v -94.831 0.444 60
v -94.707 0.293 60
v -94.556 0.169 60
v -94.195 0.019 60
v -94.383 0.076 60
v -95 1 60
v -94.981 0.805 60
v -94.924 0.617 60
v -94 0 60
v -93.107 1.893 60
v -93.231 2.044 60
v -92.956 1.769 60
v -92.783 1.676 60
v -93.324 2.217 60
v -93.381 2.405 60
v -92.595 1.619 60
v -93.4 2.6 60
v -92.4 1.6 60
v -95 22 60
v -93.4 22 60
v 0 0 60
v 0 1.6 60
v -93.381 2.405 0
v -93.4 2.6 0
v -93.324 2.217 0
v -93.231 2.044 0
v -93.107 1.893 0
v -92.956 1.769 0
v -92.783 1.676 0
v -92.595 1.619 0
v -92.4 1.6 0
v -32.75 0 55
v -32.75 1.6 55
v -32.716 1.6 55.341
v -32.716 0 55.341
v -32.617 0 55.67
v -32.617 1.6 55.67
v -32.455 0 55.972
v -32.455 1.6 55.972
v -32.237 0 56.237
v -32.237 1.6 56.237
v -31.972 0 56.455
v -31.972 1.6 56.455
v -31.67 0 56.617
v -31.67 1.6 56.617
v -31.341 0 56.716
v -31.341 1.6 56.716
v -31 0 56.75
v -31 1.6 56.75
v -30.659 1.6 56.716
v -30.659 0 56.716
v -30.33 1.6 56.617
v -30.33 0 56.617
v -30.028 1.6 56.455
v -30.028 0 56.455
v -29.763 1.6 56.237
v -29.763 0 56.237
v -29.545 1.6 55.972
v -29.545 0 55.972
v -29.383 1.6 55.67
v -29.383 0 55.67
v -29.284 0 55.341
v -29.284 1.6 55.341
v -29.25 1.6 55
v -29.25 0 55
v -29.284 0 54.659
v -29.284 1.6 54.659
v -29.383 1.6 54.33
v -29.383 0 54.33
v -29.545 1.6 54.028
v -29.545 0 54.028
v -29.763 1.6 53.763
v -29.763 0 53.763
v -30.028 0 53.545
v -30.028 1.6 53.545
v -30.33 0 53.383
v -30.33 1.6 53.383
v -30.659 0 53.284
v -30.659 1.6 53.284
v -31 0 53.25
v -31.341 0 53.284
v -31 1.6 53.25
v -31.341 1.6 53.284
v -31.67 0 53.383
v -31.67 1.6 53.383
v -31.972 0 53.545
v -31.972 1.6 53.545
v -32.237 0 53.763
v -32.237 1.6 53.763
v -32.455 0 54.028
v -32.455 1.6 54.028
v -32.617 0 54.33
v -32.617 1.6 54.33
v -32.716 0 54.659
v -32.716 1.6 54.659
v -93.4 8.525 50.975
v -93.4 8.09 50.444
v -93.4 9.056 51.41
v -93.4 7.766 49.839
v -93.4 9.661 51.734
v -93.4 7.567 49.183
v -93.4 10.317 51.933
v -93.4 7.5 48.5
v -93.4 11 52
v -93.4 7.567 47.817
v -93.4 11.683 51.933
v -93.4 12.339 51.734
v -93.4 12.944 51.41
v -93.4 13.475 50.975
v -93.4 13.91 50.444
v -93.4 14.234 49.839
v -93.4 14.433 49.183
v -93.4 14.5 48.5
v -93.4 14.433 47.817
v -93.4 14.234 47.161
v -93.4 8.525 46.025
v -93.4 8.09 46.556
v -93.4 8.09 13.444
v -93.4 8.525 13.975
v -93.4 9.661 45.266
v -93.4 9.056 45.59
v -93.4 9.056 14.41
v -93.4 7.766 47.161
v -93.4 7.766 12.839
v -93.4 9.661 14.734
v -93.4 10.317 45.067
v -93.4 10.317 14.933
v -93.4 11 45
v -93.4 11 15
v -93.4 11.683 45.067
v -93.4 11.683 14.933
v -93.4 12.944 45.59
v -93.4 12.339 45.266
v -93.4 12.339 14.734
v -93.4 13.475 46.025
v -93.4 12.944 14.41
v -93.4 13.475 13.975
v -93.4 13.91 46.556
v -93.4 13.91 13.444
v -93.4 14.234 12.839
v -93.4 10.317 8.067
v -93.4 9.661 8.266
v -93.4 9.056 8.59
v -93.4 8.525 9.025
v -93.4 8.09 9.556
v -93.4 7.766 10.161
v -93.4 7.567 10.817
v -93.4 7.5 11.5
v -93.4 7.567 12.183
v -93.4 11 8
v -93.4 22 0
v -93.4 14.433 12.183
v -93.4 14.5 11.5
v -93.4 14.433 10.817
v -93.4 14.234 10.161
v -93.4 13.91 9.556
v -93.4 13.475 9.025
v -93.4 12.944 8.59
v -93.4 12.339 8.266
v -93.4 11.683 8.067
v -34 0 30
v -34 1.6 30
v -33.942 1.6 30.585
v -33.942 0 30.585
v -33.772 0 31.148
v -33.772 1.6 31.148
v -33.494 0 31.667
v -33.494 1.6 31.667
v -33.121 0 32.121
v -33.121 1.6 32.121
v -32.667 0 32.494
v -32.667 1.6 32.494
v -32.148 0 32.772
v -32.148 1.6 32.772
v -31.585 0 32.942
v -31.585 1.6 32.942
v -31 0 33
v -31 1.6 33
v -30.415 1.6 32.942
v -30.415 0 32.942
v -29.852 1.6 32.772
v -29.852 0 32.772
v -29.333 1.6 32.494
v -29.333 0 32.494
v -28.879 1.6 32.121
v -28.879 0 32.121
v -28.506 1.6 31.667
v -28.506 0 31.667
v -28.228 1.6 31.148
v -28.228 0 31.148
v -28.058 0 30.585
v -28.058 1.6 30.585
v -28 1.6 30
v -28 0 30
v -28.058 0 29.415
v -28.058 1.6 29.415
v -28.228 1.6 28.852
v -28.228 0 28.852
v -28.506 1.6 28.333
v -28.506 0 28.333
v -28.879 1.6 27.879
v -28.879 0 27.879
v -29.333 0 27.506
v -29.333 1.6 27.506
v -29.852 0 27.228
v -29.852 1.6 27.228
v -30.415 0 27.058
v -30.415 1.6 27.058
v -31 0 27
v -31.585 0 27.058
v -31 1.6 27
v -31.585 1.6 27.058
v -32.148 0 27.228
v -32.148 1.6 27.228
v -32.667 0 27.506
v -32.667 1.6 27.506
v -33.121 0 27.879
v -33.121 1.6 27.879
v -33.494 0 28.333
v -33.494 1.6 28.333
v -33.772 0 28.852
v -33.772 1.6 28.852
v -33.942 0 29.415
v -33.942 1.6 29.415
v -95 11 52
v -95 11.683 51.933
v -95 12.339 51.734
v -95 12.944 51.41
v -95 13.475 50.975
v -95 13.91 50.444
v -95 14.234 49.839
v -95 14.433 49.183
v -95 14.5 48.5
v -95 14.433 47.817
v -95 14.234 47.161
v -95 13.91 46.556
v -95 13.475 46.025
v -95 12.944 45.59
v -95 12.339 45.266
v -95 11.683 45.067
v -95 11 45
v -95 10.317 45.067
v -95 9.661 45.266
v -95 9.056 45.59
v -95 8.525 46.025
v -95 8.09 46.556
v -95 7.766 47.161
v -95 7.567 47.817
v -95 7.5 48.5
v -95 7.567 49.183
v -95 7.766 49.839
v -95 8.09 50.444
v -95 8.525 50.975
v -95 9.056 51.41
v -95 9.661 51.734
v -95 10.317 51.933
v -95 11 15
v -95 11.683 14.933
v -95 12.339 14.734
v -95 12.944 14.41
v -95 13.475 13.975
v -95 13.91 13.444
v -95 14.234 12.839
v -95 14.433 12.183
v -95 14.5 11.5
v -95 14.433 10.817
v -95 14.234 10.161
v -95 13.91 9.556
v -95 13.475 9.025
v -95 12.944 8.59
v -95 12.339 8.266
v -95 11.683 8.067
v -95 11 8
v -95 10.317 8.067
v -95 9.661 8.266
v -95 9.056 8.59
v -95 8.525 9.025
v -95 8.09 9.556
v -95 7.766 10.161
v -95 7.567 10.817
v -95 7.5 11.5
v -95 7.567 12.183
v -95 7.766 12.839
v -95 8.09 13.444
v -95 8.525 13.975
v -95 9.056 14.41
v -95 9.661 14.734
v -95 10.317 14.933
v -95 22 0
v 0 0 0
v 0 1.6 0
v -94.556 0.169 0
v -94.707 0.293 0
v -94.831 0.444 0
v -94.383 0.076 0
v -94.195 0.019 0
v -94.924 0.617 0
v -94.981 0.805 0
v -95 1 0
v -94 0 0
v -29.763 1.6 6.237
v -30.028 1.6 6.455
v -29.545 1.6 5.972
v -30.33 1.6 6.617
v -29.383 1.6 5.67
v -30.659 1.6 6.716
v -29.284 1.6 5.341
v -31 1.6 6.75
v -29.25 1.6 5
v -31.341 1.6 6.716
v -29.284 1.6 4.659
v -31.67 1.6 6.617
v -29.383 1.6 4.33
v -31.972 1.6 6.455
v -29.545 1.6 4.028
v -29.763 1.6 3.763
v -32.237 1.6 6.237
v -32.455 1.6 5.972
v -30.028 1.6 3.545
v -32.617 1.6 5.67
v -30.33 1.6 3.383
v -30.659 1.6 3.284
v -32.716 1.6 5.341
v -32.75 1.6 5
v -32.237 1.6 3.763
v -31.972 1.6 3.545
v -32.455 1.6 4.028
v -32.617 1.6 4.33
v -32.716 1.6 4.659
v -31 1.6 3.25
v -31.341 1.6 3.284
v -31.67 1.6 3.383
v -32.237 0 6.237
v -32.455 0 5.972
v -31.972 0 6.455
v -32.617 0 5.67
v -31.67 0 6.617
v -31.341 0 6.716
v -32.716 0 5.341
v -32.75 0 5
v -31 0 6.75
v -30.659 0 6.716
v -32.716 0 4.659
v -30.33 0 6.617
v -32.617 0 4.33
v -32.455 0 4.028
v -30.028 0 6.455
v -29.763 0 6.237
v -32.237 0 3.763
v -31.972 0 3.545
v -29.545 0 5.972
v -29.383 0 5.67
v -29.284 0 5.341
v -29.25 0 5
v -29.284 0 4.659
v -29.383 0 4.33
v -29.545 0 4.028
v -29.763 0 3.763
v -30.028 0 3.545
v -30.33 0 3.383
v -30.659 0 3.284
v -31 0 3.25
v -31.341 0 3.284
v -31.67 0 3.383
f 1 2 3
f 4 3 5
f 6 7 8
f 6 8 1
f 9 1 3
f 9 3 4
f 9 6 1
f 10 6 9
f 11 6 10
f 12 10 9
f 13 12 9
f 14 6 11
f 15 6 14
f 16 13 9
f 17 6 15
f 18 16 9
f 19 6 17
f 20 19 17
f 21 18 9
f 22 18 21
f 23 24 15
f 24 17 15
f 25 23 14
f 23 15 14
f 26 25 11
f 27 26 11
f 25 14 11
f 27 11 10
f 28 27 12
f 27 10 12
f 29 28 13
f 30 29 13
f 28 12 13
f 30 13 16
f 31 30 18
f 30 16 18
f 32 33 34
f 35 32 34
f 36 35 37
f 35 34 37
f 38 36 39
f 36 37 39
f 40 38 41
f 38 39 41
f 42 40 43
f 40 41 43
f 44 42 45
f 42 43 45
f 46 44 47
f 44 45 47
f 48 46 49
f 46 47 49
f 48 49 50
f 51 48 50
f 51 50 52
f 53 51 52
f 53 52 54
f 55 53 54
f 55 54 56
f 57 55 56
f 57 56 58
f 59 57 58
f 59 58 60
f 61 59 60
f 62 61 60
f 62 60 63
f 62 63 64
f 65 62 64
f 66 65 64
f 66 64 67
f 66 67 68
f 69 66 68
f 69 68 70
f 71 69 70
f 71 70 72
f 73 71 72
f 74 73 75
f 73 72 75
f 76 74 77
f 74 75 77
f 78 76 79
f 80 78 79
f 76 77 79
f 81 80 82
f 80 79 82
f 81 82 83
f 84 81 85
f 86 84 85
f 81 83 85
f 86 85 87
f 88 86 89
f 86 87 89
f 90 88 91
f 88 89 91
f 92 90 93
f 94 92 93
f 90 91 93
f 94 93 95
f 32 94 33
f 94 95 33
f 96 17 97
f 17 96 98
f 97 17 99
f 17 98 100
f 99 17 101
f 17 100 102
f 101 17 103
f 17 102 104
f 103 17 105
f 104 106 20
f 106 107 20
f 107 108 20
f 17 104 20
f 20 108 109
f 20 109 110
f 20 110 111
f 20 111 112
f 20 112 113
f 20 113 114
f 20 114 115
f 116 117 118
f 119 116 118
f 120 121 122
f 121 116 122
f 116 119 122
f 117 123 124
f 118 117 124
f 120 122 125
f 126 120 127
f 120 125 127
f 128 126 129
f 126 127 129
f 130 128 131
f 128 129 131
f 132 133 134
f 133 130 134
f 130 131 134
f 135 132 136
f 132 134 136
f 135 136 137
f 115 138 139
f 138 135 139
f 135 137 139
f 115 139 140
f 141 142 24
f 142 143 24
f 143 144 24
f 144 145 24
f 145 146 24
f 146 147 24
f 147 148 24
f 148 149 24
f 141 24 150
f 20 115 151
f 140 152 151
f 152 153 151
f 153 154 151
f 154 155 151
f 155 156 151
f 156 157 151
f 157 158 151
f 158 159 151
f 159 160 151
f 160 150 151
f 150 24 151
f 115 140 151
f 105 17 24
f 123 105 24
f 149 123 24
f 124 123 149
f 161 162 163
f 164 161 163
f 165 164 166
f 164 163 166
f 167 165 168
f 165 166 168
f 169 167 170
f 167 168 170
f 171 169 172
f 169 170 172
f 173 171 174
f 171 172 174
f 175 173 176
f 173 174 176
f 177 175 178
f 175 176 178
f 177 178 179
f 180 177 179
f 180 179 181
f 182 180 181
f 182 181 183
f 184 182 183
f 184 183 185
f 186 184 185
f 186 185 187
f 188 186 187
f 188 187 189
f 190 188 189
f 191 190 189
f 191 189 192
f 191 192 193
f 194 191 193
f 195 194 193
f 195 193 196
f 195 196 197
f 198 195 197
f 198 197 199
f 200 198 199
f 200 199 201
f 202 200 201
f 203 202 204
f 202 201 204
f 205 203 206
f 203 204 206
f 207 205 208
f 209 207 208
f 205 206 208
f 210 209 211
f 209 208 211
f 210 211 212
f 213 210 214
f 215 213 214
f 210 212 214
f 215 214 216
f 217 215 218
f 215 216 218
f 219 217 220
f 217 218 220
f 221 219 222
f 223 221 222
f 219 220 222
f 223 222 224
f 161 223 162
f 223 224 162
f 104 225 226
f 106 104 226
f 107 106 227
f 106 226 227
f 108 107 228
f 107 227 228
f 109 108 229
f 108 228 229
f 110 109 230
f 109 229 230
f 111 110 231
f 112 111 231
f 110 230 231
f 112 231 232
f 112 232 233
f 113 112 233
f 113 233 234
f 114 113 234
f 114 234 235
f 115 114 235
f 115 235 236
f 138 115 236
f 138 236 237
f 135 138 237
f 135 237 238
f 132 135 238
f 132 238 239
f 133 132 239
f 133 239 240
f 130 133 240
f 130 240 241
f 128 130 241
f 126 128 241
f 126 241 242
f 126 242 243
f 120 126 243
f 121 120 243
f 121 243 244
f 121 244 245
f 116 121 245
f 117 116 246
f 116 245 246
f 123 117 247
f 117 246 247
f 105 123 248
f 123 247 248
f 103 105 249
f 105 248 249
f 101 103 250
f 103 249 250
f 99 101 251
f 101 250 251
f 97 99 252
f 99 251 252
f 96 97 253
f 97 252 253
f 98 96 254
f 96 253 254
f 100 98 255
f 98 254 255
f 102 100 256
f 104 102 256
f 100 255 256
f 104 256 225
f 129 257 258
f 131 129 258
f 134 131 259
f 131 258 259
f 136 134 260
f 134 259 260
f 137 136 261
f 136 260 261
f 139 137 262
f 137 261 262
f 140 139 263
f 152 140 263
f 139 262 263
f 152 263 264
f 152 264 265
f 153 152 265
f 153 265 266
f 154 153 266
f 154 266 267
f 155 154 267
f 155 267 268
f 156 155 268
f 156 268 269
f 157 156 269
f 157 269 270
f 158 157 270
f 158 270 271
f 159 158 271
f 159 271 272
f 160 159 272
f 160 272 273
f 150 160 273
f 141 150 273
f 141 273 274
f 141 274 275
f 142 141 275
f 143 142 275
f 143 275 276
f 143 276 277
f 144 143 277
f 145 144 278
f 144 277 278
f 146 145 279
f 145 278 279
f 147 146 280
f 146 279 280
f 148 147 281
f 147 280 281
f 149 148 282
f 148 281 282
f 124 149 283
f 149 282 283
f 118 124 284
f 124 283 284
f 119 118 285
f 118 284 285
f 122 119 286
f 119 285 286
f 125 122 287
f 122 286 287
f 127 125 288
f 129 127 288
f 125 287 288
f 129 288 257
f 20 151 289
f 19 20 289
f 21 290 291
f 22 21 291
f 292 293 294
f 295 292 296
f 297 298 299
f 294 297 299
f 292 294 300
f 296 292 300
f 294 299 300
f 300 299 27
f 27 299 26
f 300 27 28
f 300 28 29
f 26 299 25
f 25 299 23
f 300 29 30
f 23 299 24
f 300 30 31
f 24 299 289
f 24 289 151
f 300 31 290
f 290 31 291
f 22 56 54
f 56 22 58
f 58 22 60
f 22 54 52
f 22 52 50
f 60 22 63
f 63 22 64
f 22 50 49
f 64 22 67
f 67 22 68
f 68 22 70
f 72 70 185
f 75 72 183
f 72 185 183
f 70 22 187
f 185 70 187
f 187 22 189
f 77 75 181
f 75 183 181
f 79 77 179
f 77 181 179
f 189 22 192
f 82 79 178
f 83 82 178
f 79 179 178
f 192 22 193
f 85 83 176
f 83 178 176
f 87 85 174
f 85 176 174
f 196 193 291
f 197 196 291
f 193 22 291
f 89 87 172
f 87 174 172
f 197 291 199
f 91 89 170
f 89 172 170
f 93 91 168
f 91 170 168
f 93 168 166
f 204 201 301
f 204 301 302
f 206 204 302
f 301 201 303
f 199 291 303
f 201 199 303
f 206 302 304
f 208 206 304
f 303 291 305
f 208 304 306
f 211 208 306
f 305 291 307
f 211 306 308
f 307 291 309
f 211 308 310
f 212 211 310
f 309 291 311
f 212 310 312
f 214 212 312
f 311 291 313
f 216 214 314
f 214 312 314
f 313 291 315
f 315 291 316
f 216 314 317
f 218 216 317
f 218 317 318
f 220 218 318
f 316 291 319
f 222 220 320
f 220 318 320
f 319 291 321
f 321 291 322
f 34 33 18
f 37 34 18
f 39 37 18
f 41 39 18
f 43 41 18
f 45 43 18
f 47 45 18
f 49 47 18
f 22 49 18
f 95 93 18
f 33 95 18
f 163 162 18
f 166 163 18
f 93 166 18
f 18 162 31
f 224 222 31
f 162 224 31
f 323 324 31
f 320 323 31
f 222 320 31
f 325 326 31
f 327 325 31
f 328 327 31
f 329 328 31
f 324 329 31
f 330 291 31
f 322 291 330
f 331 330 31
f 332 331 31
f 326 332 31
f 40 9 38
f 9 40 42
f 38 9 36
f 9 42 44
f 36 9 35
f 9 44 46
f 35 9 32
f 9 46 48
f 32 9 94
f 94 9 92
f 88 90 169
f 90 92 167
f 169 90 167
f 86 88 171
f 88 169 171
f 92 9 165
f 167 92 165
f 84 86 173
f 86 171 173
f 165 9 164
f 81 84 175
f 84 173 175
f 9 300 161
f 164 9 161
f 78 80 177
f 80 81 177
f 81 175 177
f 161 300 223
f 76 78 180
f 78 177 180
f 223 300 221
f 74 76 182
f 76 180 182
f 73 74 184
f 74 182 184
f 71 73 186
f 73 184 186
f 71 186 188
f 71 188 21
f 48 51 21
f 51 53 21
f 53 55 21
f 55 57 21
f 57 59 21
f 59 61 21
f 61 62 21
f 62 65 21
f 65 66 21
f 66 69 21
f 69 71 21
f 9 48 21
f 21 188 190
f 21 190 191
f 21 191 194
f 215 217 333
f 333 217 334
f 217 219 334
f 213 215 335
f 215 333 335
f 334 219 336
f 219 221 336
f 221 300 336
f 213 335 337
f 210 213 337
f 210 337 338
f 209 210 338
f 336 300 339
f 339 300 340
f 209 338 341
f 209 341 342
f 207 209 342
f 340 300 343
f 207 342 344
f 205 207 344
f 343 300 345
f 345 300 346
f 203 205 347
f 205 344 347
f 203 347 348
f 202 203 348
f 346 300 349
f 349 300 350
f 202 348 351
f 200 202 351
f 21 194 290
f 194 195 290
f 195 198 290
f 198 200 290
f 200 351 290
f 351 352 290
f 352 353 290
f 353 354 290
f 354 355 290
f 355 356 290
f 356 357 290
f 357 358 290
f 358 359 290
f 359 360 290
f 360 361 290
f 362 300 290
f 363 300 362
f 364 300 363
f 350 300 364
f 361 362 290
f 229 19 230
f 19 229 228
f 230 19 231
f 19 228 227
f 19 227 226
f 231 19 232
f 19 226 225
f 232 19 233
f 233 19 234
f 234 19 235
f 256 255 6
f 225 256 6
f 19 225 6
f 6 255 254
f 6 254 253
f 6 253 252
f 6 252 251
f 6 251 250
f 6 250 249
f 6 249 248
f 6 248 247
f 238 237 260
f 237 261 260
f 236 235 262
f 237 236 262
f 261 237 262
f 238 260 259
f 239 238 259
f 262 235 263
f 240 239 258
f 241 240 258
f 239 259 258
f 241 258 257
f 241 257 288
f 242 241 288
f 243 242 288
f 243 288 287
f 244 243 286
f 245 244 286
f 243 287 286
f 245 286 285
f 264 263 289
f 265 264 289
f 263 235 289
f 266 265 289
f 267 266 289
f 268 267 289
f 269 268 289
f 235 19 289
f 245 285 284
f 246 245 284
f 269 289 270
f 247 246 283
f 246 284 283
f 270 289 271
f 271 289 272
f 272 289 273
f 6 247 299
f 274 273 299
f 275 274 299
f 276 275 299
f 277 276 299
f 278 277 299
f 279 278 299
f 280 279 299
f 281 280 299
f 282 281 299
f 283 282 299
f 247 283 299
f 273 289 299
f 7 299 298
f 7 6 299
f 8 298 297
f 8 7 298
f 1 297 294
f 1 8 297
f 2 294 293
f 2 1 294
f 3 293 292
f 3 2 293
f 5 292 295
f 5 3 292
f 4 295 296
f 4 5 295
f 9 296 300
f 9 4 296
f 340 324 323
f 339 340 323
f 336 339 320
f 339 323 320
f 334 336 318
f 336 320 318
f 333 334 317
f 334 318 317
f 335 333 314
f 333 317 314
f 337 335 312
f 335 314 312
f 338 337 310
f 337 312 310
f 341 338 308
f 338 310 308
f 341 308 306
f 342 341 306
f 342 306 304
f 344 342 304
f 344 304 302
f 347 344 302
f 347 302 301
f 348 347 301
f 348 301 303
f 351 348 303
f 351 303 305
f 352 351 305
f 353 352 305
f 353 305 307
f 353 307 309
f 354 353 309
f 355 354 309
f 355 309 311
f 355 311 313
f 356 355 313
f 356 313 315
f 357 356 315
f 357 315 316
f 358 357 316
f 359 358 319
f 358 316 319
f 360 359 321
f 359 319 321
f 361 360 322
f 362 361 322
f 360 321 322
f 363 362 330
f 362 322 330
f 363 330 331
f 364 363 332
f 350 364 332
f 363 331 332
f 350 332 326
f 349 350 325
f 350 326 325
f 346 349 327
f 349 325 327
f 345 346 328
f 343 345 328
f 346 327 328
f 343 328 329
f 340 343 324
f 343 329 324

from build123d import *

# Parameters (mm, degrees)
ESTRUSIONE_ESTRUSIONE1_DEPTH = 60
RACCORDO1_R                  = 1
RACCORDO2_R                  = 1
TAGLIO_ESTRUSIONE1_REACH     = 116.198
SCHIZZO2_R                   = 1.75
SCHIZZO2_R_2                 = 3
SCHIZZO3_R                   = 3.5
TAGLIO_ESTRUSIONE2_DEPTH     = 115.494541355


with BuildPart() as part:
    # Schizzo1 → Estrusione-Estrusione1 (new body)
    with BuildSketch(Plane.XY):
        Polygon((-95, 22), (-95, 0), (0, 0), (0, 1.6), (-93.4, 1.6), (-93.4, 22), align=None)
    extrude(amount=ESTRUSIONE_ESTRUSIONE1_DEPTH)

    # Raccordo1
    raccordo1_edges = [part.edges().sort_by_distance(p)[0] for p in [
        (-95, 0, 30),
    ]]
    fillet(raccordo1_edges, radius=RACCORDO1_R)

    # Raccordo2
    raccordo2_edges = [part.edges().sort_by_distance(p)[0] for p in [
        (-93.4, 1.6, 30),
    ]]
    fillet(raccordo2_edges, radius=RACCORDO2_R)

    # Schizzo2 → Taglio-Estrusione1 (cut, up to next)
    with BuildSketch(Plane(origin=(0, 1.6, 0), x_dir=(1, 0, 0), z_dir=(0, 1, 0)), mode=Mode.PRIVATE) as taglio_estrusione1_sk1:
        with Locations(Location((-31, -5, 0), (0, 0, 180))):
            Circle(SCHIZZO2_R)
    taglio_estrusione1_tool1 = extrude(taglio_estrusione1_sk1.sketch, amount=-TAGLIO_ESTRUSIONE1_REACH, mode=Mode.PRIVATE) & part.part
    # Schizzo2 → Taglio-Estrusione1 (cut, up to next)
    with BuildSketch(Plane(origin=(0, 1.6, 0), x_dir=(1, 0, 0), z_dir=(0, 1, 0)), mode=Mode.PRIVATE) as taglio_estrusione1_sk2:
        with Locations(Location((-31, -30, 0), (0, 0, 180))):
            Circle(SCHIZZO2_R_2)
    taglio_estrusione1_tool2 = extrude(taglio_estrusione1_sk2.sketch, amount=-TAGLIO_ESTRUSIONE1_REACH, mode=Mode.PRIVATE) & part.part
    # Schizzo2 → Taglio-Estrusione1 (cut, up to next)
    with BuildSketch(Plane(origin=(0, 1.6, 0), x_dir=(1, 0, 0), z_dir=(0, 1, 0)), mode=Mode.PRIVATE) as taglio_estrusione1_sk3:
        with Locations(Location((-31, -55, 0), (0, 0, 180))):
            Circle(SCHIZZO2_R)
    taglio_estrusione1_tool3 = extrude(taglio_estrusione1_sk3.sketch, amount=-TAGLIO_ESTRUSIONE1_REACH, mode=Mode.PRIVATE) & part.part
    add(taglio_estrusione1_tool1.solids().sort_by_distance((-31, 1.6, 5))[0], mode=Mode.SUBTRACT)
    add(taglio_estrusione1_tool2.solids().sort_by_distance((-31, 1.6, 30))[0], mode=Mode.SUBTRACT)
    add(taglio_estrusione1_tool3.solids().sort_by_distance((-31, 1.6, 55))[0], mode=Mode.SUBTRACT)

    # Schizzo3 → Taglio-Estrusione2 (cut, through all)
    with BuildSketch(Plane.ZY.offset(95)):
        with Locations((11.5, 11)):
            Circle(SCHIZZO3_R)
        with Locations((48.5, 11)):
            Circle(SCHIZZO3_R)
    extrude(amount=-TAGLIO_ESTRUSIONE2_DEPTH, mode=Mode.SUBTRACT)


solid = part.part
